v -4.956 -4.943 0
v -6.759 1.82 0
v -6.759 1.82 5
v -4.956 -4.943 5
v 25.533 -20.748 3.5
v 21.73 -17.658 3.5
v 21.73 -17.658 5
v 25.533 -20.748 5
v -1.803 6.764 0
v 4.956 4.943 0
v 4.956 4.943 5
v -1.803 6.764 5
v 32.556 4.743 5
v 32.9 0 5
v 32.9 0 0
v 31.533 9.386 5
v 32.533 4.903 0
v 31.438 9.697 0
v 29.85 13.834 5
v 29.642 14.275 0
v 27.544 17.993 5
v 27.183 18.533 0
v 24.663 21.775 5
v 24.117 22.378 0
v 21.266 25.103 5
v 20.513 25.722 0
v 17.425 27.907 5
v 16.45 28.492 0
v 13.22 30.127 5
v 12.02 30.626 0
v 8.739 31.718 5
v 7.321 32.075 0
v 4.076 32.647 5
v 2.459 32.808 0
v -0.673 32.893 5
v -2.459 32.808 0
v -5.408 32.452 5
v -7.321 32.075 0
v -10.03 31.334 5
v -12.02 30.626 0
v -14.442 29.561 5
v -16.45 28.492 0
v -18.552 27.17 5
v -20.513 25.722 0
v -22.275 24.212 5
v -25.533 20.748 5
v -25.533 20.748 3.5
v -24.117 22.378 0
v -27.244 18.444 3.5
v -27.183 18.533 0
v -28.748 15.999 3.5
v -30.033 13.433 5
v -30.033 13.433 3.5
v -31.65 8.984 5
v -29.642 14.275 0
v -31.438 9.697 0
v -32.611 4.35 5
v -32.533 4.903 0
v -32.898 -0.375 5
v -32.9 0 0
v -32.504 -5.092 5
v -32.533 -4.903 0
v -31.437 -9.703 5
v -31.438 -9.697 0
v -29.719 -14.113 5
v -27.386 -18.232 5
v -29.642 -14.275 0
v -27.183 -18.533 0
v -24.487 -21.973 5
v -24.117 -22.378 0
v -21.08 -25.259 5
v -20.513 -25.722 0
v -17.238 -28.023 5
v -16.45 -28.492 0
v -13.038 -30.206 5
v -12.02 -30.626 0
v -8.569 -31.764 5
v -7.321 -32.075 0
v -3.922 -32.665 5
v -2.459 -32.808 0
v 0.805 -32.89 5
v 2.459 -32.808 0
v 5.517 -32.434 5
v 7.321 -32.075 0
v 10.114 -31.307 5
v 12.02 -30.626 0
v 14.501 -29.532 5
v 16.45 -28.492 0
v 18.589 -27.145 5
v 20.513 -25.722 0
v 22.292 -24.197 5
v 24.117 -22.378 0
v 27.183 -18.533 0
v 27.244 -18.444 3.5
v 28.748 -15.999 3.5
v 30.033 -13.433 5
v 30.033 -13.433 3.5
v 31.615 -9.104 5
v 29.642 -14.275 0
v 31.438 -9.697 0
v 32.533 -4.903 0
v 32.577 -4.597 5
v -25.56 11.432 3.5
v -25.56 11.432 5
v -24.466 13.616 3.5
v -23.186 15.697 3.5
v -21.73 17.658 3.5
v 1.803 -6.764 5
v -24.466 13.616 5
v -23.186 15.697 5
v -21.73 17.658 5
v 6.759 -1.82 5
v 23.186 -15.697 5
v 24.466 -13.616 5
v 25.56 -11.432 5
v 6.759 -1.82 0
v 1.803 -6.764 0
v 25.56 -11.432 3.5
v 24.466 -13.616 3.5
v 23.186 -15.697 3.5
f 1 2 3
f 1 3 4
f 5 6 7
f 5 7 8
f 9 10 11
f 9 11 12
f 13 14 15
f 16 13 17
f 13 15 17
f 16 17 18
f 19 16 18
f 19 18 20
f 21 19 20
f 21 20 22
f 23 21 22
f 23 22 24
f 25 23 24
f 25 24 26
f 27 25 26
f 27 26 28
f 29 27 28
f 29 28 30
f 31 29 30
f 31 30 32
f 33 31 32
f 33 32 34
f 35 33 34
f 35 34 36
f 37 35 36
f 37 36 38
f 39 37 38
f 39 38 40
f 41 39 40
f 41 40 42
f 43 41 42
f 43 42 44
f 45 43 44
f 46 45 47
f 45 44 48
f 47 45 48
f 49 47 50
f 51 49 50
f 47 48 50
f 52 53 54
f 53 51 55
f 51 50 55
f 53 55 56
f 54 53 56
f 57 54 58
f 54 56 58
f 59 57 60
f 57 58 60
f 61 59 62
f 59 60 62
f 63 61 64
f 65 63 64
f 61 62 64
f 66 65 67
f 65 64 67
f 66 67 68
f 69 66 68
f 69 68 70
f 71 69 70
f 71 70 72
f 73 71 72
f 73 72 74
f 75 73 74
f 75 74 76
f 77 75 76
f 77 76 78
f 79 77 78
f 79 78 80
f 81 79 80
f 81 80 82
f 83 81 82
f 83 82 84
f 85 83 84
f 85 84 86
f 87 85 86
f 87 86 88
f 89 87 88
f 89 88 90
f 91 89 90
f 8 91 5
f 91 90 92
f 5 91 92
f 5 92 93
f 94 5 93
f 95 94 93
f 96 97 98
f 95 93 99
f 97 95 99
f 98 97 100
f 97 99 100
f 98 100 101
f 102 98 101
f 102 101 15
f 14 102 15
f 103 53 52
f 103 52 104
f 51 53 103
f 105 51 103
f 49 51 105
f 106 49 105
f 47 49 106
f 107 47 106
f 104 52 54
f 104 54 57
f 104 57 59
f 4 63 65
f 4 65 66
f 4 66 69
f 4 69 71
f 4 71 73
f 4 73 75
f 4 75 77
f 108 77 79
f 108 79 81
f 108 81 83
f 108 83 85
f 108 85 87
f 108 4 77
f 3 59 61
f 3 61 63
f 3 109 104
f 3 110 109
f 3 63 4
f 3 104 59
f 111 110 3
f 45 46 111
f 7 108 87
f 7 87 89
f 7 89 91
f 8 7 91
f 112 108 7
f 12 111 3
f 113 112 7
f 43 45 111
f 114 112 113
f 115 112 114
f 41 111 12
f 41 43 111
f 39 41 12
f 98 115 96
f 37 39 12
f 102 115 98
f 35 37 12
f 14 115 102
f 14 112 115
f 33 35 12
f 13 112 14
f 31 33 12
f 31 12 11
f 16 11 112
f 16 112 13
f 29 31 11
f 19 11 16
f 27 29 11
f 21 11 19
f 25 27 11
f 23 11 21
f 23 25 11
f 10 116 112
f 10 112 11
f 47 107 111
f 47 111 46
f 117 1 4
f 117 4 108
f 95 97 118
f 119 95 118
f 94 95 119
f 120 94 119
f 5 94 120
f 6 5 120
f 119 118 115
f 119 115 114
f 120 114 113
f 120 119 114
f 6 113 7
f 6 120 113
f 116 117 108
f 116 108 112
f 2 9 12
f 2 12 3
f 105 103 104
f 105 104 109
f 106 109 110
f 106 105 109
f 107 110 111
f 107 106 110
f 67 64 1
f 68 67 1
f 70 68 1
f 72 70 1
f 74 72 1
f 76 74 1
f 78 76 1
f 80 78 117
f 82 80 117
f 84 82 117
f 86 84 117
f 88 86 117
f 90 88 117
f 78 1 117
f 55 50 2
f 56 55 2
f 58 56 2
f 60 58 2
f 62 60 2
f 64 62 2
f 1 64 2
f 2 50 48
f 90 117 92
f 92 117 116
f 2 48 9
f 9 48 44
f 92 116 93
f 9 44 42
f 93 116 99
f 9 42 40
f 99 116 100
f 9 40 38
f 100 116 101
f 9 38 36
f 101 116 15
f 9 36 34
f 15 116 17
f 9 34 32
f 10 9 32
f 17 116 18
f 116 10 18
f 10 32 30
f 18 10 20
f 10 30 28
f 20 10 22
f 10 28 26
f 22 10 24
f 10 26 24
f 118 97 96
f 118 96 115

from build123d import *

# Parameters (mm, degrees)
SKETCH_1_R               = 32.9
EXTRUDE_1_DEPTH          = 5
CUT_EXTRUDE_START        = -1.5
CUT_EXTRUDE_1_DEPTH      = 1.5
PATTERN_CIRCULAR_1_COUNT = 2


with BuildPart() as part:
    # 草图1 → 凸台-拉伸1 (new body)
    with BuildSketch(Plane.XY):
        Circle(SKETCH_1_R)
        Polygon((6.759189323, -1.820263634), (4.95598921, 4.943497845), (-1.803200113, 6.76376148), (-6.759189323, 1.820263634), (-4.95598921, -4.943497845), (1.803200113, -6.76376148), align=None, mode=Mode.SUBTRACT)
    extrude(amount=EXTRUDE_1_DEPTH)

    # 草图2 → 切除-拉伸1 (cut)
    with BuildSketch(Plane.XY.offset(5).offset(CUT_EXTRUDE_START)):
        with BuildLine():
            Line((-30.032915542, 13.432571759), (-25.559928121, 11.431975965))
            ThreePointArc((-25.559928121, 11.431975965), (-23.8490871, 14.670413917), (-21.730181587, 17.657837019))
            Line((-21.730181587, 17.657837019), (-25.532963365, 20.747958497))
            ThreePointArc((-25.532963365, 20.747958497), (-28.022677343, 17.237736352), (-30.032915542, 13.432571759))
        make_face()
    cut_extrude_1 = extrude(amount=CUT_EXTRUDE_1_DEPTH, mode=Mode.SUBTRACT)

    # 阵列(圆周)1: 切除-拉伸1 ×2 about axis
    pattern_circular_1_axis = Axis((0, 0, 0), (0, 0, 1))
    for i in range(1, PATTERN_CIRCULAR_1_COUNT):
        add(cut_extrude_1.rotate(pattern_circular_1_axis, i * 360 / PATTERN_CIRCULAR_1_COUNT), mode=Mode.SUBTRACT)


solid = part.part
